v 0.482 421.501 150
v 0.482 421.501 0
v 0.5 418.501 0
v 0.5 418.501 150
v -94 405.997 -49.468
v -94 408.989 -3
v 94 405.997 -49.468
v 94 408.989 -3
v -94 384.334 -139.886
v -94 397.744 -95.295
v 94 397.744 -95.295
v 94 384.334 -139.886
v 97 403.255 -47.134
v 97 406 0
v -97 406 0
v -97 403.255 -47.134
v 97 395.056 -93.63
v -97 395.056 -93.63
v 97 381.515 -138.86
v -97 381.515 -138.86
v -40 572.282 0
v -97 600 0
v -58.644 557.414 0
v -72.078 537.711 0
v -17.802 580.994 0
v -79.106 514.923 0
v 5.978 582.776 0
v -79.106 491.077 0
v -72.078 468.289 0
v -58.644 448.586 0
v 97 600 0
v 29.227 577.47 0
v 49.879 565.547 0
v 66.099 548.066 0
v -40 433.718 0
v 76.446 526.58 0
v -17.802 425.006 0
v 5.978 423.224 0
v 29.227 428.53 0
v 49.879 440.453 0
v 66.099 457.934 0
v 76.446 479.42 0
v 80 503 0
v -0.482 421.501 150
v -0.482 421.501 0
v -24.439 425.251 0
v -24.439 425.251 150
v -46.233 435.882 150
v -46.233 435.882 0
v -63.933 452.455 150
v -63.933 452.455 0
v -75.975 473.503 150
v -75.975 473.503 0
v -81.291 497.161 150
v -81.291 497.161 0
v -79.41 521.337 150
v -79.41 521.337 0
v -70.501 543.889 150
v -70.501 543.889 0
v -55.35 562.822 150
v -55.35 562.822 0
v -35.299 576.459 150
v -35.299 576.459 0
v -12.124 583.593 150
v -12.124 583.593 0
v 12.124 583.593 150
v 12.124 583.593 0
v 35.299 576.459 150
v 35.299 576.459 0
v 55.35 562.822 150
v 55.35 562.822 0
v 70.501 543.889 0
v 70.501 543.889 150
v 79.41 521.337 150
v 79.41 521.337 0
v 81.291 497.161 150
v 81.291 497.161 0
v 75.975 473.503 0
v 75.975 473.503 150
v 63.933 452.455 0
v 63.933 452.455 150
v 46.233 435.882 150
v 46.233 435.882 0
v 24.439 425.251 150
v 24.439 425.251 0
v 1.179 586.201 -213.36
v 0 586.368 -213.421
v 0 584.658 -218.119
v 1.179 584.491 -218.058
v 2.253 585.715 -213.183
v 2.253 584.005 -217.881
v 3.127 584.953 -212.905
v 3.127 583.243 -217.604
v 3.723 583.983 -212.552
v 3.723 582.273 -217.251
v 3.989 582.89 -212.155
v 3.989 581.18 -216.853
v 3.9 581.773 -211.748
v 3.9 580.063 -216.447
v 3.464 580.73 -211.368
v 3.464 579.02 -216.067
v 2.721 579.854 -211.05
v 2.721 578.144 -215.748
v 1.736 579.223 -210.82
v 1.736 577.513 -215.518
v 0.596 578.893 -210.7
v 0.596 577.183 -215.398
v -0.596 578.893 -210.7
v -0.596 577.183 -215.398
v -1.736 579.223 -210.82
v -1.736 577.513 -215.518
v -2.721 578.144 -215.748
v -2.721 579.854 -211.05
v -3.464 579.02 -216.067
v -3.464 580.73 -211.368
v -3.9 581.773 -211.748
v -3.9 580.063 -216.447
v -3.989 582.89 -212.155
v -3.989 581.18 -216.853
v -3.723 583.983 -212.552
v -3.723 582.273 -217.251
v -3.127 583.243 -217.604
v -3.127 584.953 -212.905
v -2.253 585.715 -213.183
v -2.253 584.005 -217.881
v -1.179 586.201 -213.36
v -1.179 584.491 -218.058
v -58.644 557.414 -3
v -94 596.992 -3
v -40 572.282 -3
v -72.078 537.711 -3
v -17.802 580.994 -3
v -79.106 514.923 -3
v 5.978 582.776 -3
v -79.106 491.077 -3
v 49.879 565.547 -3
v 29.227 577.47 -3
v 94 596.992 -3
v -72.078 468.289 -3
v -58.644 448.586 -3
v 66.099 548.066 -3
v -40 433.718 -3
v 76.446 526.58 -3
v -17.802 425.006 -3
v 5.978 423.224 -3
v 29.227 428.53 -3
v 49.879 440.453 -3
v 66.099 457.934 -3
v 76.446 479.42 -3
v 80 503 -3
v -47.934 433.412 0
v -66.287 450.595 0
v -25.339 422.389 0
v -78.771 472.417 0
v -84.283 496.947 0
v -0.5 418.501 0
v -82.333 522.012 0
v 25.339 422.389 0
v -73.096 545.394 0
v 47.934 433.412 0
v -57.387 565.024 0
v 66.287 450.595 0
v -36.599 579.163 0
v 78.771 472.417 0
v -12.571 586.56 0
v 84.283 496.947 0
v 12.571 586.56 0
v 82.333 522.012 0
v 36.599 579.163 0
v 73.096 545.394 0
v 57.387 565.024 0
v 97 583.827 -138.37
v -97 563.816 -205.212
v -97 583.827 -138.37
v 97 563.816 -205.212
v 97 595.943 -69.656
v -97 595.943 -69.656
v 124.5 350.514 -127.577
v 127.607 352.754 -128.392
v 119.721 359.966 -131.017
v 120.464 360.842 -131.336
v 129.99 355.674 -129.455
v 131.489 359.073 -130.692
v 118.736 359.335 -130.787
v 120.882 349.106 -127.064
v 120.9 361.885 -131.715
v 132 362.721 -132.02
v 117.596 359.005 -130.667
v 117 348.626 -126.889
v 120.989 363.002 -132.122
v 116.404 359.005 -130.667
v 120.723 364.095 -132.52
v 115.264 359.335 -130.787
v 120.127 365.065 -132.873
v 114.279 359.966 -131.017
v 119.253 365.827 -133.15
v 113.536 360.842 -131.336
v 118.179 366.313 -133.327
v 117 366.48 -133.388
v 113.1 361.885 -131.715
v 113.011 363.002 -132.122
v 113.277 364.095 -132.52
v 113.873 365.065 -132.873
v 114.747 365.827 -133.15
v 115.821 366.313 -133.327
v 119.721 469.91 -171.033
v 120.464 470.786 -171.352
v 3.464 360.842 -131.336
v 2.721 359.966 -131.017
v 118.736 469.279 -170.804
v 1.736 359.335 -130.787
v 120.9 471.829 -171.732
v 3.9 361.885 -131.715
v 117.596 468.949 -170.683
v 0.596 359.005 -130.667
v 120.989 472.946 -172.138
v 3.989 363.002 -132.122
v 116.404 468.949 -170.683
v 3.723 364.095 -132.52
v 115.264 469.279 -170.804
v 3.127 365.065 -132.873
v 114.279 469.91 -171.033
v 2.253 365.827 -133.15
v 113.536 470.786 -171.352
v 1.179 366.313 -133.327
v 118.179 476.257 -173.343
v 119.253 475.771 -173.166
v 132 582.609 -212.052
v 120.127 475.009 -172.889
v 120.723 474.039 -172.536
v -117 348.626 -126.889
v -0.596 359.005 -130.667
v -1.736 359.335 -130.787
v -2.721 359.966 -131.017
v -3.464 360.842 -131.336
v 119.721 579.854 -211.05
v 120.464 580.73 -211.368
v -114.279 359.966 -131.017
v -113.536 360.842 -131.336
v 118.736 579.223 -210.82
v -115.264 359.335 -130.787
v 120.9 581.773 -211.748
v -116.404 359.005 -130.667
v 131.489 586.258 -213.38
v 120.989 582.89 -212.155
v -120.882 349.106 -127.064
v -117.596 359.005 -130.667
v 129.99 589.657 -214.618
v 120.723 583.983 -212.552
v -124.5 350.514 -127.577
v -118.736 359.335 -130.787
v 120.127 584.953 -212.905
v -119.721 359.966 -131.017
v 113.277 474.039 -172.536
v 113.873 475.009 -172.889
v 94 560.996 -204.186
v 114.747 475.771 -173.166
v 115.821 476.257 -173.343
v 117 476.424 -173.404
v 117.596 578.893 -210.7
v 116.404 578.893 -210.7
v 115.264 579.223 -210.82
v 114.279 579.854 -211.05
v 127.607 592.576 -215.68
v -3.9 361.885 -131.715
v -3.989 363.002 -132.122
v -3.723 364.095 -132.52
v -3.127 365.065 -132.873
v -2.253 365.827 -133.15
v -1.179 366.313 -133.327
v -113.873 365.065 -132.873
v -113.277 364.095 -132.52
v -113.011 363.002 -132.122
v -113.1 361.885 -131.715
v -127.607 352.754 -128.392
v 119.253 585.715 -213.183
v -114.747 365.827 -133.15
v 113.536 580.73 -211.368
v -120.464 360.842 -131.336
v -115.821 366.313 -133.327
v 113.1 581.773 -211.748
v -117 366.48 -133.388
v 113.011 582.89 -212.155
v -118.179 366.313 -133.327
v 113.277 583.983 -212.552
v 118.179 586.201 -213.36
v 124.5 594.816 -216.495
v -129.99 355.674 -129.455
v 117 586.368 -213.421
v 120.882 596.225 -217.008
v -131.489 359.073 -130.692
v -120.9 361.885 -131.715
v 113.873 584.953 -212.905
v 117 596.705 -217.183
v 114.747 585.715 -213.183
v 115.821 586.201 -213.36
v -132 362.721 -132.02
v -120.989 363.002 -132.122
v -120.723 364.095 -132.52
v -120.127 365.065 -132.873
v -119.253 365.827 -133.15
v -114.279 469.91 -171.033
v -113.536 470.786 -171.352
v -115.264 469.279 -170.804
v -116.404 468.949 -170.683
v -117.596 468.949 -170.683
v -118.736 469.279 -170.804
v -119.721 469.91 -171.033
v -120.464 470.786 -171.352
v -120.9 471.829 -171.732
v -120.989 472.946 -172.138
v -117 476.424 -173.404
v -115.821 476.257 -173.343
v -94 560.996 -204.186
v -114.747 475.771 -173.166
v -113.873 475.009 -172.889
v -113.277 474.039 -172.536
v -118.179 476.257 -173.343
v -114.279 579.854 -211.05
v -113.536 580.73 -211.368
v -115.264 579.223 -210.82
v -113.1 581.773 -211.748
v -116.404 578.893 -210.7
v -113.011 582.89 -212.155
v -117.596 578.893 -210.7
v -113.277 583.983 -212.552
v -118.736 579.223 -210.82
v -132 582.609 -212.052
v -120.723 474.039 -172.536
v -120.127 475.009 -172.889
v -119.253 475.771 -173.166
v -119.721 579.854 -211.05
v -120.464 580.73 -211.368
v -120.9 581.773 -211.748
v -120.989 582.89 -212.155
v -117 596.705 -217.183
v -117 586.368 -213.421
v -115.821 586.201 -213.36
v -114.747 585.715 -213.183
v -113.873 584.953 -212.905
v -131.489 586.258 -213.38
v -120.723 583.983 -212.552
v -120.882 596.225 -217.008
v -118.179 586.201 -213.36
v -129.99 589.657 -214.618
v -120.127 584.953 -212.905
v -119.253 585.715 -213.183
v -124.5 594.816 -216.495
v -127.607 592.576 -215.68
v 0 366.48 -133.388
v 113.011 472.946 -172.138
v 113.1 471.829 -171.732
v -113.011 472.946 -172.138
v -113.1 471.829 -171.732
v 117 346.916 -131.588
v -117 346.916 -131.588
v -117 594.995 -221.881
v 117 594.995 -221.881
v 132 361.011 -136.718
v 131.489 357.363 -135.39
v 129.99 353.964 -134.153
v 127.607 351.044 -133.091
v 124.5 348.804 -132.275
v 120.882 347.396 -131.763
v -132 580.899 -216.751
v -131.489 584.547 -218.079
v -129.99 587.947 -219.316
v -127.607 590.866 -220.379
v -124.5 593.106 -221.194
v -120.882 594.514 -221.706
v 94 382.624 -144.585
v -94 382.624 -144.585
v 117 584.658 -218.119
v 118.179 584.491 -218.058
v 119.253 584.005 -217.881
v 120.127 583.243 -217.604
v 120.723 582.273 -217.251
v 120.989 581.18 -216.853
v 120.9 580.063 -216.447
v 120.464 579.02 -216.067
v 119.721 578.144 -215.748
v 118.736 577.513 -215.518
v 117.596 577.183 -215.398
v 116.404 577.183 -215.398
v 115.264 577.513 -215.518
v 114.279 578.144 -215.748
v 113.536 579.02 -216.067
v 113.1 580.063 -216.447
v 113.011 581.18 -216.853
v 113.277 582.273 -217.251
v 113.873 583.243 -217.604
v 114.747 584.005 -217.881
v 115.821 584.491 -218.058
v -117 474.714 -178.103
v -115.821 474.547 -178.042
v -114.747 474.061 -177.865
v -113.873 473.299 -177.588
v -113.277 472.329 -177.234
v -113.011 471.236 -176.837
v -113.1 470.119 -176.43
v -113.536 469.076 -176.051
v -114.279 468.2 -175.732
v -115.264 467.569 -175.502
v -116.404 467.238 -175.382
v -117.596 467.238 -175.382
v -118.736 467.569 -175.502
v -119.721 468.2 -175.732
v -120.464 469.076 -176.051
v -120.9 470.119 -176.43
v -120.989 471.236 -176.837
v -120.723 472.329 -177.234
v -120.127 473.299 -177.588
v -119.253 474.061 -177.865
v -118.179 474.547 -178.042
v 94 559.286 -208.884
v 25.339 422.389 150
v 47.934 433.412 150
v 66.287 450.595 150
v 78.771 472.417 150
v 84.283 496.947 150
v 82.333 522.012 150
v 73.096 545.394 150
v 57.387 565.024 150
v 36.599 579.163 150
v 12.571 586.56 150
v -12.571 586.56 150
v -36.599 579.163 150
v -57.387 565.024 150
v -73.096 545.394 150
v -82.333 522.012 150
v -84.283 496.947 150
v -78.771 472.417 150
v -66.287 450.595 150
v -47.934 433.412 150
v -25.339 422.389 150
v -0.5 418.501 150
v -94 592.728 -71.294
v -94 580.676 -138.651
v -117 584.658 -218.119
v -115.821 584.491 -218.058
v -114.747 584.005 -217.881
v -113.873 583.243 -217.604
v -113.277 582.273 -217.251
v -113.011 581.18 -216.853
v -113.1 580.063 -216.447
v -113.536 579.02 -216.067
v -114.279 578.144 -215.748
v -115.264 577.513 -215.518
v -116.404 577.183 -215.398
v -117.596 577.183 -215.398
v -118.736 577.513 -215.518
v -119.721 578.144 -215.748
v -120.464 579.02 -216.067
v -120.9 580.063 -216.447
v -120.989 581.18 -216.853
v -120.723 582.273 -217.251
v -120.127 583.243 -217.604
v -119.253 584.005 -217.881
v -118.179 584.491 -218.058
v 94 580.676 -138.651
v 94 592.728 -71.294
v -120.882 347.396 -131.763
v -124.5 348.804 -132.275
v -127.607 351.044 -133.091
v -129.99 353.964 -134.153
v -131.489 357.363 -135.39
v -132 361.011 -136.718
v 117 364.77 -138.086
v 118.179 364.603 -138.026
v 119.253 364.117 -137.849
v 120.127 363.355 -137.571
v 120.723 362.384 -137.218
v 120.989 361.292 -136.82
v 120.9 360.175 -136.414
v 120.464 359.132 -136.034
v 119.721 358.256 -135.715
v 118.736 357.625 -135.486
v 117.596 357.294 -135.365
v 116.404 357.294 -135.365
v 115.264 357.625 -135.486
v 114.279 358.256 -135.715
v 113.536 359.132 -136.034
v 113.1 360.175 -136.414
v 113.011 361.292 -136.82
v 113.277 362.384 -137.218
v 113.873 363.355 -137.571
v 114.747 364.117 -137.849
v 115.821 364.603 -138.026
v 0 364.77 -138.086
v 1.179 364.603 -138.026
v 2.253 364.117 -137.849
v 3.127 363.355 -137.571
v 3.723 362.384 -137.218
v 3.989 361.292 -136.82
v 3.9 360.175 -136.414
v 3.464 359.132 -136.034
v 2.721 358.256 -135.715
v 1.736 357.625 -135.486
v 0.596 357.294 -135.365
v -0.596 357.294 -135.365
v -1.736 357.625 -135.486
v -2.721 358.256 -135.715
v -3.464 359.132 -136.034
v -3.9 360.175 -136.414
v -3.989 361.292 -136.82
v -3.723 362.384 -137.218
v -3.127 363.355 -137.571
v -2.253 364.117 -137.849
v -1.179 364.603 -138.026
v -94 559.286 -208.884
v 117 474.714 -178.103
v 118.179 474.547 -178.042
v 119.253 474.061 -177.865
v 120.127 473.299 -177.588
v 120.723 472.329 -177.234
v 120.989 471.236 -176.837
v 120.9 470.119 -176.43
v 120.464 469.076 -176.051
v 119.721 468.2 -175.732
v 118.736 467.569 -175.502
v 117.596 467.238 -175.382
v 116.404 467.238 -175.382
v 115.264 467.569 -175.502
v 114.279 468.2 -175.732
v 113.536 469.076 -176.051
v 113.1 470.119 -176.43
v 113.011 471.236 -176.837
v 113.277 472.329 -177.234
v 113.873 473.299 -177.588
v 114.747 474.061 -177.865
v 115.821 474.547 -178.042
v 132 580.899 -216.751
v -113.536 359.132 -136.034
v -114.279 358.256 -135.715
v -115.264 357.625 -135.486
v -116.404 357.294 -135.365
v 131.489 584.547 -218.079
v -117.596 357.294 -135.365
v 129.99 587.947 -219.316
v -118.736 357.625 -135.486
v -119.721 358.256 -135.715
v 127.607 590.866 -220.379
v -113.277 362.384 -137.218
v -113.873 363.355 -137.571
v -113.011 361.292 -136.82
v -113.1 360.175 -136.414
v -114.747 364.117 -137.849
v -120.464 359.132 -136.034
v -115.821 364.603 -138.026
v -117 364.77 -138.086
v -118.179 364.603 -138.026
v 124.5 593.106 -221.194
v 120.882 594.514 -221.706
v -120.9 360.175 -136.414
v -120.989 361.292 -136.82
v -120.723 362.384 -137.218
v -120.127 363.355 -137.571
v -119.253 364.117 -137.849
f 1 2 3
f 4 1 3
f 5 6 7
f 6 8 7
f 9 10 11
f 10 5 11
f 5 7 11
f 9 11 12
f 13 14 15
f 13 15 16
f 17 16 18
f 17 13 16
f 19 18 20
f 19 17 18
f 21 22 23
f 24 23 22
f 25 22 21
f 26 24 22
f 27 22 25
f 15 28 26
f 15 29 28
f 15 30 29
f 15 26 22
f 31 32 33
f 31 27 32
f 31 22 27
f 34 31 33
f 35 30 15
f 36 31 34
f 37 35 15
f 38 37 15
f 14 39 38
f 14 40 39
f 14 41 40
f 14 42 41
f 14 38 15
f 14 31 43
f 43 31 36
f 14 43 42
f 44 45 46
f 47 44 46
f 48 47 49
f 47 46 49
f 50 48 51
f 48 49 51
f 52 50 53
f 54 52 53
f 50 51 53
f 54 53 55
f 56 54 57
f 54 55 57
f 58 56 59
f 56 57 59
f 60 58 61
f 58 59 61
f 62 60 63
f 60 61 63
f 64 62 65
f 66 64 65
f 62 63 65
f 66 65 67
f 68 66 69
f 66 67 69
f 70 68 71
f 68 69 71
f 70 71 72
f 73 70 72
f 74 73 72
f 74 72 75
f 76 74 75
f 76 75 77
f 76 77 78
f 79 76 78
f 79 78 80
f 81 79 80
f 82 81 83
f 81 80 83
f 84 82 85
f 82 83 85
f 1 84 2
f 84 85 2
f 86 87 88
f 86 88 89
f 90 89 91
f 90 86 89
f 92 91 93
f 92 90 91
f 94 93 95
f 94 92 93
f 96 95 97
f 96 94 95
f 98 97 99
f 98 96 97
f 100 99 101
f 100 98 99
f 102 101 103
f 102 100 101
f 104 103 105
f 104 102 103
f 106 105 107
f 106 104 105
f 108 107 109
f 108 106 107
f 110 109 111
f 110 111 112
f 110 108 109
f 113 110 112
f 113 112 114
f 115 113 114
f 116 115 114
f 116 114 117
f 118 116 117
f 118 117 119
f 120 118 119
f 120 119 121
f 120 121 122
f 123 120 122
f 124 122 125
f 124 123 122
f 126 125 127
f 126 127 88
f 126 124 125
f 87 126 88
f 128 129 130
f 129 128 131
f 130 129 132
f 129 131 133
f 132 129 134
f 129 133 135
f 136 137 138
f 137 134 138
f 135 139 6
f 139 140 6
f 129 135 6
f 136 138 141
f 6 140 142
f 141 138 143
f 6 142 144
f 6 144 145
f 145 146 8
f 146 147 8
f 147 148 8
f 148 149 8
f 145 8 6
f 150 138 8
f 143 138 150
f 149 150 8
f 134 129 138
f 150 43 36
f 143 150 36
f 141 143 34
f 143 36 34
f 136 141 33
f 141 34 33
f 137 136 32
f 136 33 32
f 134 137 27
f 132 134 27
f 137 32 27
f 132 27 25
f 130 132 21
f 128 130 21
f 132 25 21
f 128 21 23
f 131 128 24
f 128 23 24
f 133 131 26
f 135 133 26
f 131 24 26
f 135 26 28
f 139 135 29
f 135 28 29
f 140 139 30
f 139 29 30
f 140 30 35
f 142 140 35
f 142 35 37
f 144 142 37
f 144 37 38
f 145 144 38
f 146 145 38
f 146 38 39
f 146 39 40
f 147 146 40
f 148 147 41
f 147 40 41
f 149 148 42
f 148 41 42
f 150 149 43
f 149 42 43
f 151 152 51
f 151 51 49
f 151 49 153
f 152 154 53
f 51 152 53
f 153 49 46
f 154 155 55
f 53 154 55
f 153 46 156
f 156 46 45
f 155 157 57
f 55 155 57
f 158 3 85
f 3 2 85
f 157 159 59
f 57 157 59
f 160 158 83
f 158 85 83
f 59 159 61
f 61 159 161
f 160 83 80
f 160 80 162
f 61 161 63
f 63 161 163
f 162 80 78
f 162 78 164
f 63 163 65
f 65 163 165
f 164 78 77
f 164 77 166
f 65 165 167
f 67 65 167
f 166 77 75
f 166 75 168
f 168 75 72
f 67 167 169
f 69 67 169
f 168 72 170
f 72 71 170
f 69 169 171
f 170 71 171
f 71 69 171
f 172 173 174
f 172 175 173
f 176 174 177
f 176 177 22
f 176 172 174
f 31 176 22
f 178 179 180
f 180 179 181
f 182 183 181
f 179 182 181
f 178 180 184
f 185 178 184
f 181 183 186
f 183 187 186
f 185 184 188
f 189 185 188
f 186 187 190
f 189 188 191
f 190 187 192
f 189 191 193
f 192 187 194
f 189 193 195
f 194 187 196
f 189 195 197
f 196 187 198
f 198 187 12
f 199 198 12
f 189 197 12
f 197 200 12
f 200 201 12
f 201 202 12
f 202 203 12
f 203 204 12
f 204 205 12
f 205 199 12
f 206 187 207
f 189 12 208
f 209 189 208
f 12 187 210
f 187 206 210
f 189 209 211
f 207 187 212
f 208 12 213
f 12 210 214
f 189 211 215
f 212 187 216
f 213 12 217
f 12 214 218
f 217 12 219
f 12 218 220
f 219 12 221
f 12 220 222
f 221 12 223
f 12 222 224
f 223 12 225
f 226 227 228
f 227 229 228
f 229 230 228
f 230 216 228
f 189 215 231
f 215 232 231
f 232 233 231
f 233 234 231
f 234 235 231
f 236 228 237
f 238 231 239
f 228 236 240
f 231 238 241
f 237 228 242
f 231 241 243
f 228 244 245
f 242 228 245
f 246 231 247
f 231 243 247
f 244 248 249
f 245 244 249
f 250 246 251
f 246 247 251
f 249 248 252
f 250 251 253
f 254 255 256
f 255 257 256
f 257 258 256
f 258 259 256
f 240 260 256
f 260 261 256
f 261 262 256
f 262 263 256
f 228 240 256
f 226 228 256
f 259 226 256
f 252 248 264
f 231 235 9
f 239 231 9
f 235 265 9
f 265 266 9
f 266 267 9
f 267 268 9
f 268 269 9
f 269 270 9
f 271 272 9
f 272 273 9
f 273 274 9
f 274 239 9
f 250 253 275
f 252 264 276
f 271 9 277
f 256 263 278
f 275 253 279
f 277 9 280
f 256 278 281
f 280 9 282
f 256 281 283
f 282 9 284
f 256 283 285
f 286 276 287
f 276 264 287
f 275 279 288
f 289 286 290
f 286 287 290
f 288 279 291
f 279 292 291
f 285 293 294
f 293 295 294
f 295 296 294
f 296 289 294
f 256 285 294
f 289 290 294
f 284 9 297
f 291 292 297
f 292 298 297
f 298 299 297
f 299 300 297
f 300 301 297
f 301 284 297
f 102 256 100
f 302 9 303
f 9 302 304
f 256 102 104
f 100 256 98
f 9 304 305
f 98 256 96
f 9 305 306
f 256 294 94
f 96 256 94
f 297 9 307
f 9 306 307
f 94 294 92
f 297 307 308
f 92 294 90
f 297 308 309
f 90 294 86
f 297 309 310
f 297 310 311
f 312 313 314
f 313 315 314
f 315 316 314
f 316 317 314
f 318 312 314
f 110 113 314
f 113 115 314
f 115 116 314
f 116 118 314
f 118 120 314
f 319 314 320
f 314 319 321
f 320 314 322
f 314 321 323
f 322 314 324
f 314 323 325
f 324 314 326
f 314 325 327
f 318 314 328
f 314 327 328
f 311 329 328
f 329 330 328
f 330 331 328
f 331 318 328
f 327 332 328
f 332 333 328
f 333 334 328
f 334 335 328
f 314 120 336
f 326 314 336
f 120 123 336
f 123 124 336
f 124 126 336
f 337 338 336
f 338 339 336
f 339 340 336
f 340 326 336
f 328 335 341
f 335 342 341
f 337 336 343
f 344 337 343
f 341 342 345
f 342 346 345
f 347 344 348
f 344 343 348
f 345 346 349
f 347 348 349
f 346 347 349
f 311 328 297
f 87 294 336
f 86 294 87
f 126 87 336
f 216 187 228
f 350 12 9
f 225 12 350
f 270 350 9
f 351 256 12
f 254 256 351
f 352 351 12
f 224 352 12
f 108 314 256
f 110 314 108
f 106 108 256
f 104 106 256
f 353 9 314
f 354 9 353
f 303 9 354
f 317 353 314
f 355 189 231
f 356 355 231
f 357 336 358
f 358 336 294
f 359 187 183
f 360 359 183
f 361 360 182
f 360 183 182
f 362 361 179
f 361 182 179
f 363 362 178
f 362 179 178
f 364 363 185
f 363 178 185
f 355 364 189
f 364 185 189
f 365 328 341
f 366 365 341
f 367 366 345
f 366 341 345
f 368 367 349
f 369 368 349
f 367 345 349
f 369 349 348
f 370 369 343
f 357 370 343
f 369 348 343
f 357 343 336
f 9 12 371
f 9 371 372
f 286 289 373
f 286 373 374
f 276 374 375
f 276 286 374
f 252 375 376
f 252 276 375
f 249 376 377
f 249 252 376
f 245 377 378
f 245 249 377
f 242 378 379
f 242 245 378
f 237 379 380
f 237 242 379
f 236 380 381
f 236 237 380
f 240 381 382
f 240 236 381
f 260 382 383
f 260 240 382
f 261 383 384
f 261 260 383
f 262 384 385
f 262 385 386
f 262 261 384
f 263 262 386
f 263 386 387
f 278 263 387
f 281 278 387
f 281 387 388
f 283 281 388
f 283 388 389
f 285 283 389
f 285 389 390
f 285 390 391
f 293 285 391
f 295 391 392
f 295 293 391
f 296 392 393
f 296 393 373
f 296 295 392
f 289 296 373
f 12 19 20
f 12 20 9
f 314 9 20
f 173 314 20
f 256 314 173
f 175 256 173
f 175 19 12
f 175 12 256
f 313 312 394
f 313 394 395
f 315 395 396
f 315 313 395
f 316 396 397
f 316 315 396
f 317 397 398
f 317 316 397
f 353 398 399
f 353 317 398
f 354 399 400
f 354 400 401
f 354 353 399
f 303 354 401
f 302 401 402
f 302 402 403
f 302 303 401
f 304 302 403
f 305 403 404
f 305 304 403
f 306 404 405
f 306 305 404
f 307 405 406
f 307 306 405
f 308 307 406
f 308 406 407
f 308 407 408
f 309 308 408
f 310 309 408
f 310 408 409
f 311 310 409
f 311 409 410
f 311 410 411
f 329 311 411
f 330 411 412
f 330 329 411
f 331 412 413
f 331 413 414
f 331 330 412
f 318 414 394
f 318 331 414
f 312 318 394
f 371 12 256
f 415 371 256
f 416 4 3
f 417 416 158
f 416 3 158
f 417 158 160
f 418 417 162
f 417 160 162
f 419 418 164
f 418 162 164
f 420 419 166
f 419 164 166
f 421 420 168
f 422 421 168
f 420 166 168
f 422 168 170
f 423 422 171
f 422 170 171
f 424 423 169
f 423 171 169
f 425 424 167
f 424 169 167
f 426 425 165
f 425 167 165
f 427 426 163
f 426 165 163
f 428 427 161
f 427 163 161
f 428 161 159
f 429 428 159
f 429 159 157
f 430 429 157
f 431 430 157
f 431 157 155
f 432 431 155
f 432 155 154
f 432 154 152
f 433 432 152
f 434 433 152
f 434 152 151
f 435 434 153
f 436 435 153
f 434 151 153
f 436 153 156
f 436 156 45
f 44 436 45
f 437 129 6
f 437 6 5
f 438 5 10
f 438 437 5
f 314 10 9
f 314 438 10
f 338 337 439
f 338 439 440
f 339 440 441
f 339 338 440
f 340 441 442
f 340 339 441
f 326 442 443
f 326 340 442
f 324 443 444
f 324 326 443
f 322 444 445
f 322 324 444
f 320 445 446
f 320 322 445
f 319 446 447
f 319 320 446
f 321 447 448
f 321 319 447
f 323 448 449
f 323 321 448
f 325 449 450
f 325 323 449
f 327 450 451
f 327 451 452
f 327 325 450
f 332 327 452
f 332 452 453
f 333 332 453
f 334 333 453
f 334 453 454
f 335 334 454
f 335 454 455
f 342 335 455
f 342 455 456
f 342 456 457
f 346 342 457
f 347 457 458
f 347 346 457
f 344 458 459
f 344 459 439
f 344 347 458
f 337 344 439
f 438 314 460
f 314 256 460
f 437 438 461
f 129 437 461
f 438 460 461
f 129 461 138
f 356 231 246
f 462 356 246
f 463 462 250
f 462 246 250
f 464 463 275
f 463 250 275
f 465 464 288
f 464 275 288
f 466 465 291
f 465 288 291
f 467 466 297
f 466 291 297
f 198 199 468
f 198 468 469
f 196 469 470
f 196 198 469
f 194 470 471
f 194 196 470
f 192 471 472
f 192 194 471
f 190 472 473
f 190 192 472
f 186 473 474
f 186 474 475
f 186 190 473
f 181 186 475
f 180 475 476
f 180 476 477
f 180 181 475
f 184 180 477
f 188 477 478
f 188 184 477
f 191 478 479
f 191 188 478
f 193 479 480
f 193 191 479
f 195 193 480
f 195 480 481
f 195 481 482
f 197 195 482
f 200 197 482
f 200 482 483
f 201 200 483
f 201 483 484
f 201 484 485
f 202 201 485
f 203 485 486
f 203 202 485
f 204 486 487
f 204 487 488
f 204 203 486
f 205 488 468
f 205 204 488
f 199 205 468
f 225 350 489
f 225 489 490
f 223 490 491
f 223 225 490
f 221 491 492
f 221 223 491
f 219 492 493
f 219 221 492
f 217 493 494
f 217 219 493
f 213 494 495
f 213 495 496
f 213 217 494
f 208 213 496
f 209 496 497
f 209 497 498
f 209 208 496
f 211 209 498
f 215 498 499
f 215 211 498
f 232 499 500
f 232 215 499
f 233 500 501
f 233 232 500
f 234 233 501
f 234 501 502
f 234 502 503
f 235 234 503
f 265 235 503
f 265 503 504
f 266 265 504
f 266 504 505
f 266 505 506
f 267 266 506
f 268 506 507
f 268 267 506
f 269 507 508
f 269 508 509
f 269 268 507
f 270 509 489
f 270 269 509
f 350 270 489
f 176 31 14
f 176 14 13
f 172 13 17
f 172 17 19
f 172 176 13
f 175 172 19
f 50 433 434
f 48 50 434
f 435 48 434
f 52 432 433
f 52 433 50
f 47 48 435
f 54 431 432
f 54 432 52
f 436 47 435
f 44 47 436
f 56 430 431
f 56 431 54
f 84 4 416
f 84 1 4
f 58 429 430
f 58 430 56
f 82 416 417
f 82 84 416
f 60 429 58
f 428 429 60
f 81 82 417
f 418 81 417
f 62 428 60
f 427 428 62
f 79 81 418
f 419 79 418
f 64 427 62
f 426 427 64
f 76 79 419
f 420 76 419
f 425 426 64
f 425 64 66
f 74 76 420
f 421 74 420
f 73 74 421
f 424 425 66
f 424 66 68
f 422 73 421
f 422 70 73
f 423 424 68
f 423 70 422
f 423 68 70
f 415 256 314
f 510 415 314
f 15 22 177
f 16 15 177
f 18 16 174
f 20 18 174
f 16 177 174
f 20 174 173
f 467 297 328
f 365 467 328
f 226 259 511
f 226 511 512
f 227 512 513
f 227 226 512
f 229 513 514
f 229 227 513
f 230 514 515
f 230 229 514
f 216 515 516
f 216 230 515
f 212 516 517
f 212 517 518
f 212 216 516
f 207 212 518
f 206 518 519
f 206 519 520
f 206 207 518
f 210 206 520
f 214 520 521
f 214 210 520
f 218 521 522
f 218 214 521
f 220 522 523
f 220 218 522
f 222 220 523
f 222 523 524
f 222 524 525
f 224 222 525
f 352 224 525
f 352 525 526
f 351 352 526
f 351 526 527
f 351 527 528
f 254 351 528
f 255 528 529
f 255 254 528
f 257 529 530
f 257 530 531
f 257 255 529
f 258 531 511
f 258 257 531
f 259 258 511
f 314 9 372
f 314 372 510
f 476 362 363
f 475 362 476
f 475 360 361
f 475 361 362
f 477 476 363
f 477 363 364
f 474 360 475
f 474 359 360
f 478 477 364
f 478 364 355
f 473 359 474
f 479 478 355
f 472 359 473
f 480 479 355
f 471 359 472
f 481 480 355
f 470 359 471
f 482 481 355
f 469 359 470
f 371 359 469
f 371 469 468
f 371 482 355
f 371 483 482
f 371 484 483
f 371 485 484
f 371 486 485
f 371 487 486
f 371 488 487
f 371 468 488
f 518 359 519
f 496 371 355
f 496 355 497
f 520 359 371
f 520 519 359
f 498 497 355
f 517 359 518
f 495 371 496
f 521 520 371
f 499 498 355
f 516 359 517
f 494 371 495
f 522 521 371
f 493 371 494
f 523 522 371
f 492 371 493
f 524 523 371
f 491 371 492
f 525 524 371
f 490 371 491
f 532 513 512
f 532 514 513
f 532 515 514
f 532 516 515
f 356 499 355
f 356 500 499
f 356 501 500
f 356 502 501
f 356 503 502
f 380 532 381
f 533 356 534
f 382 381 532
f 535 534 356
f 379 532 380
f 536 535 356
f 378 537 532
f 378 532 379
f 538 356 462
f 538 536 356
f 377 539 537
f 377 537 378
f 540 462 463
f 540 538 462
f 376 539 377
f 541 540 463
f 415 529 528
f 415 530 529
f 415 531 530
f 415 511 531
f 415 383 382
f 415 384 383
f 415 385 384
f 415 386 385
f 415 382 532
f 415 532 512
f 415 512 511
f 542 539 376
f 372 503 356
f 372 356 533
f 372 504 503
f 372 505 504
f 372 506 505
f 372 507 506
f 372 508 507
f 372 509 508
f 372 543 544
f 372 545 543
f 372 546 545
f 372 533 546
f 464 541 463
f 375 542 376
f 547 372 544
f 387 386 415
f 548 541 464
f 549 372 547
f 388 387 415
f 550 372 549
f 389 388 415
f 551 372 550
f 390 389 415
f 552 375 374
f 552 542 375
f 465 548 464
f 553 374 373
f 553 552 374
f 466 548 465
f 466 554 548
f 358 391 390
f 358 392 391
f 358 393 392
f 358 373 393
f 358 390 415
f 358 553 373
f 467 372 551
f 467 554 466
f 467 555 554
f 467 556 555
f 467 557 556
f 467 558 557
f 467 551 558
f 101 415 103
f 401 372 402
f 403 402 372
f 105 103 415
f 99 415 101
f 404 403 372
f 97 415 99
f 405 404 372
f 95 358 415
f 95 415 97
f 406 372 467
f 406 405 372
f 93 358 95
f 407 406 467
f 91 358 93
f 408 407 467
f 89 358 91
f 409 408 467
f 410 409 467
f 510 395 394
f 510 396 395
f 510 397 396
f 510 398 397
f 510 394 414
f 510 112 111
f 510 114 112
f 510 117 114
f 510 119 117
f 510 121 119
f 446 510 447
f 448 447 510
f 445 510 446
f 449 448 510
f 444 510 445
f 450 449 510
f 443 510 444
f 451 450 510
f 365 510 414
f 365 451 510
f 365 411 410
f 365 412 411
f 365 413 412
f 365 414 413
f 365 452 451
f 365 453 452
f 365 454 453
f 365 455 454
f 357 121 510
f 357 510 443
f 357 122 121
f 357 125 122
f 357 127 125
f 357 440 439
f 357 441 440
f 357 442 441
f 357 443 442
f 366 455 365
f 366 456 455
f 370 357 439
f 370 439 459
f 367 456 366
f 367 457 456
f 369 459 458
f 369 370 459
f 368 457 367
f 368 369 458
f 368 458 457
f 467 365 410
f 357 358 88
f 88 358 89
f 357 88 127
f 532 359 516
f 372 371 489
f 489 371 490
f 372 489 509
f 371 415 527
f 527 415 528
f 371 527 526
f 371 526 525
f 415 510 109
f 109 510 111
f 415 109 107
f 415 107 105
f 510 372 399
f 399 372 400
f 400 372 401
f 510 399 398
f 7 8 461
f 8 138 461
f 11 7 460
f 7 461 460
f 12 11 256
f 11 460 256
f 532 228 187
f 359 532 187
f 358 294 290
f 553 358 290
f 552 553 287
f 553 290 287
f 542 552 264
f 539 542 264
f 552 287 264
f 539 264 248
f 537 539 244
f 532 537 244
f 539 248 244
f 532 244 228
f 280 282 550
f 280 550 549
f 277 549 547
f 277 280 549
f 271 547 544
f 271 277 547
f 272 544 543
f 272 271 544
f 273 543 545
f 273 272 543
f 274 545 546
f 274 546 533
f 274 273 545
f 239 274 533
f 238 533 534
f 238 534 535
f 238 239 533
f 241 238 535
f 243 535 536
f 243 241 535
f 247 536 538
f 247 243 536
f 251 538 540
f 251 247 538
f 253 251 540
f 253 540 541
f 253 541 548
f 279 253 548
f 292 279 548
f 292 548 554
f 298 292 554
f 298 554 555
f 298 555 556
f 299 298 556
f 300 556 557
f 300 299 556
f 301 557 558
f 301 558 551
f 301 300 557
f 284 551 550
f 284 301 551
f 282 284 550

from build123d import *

# Parameters (mm, degrees)
BOSS_EXTRUDE1_DEPTH = 97
SHELL2_T            = -3
SKETCH2_R           = 80
CUT_EXTRUDE1_DEPTH  = 3
BASE_FLANGE1_DEPTH  = 150
SKETCH8_R           = 4
SKETCH8_W           = 188
SKETCH8_H           = 188
BOSS_EXTRUDE2_DEPTH = 5


# Sheet-metal steps are written as plain solids
with BuildPart() as part:
    # Sketch1 → Boss-Extrude1 (new, symmetric)
    with BuildSketch(Plane(origin=(0, 0, 0), x_dir=(0, 0, -1), z_dir=(1, 0, 0))):
        with BuildLine():
            Line((0, 600), (0, 406))
            ThreePointArc((0, 406), (70.501160133, 399.831947723), (138.86017819, 381.515204039))
            Line((138.86017819, 381.515204039), (205.212085995, 563.815572472))
            ThreePointArc((205.212085995, 563.815572472), (104.1889066, 590.884651807), (0, 600))
        make_face()
    extrude(amount=BOSS_EXTRUDE1_DEPTH, both=True)

    # Shell2
    shell2_openings = [part.faces().sort_by_distance(p)[0] for p in [
        (0, 472.665388255, -172.036132093),
    ]]
    offset(amount=SHELL2_T, openings=shell2_openings, kind=Kind.INTERSECTION)

    # Sketch2 → Cut-Extrude1 (cut)
    with BuildSketch(Plane.XY):
        with Locations((0, 503)):
            Circle(SKETCH2_R)
    extrude(amount=-CUT_EXTRUDE1_DEPTH, mode=Mode.SUBTRACT)


with BuildPart() as body_2:
    # Sketch3 → Base-Flange1 (new body)
    with BuildSketch(Plane.XY):
        with BuildLine():
            ThreePointArc((0.499997812, 418.50147929), (0, 587.5), (-0.499997812, 418.50147929))
            Line((-0.499997812, 418.50147929), (-0.48224641, 421.501426771))
            ThreePointArc((-0.48224641, 421.501426771), (0, 584.5), (0.48224641, 421.501426771))
            Line((0.48224641, 421.501426771), (0.499997812, 418.50147929))
        make_face()
    extrude(amount=BASE_FLANGE1_DEPTH)


with BuildPart() as body_3:
    # Sketch8 → Boss-Extrude2 (new body)
    with BuildSketch(Plane(origin=(0, 0, 0), x_dir=(-1, 0, 0), z_dir=(0, -0.3420201433256697, -0.939692620785908))):
        with BuildLine():
            Line((-117, 371), (117, 371))
            ThreePointArc((117, 371), (127.606601718, 375.393398282), (132, 386))
            Line((132, 386), (132, 620))
            ThreePointArc((132, 620), (127.606601718, 630.606601718), (117, 635))
            Line((117, 635), (-117, 635))
            ThreePointArc((-117, 635), (-127.606601718, 630.606601718), (-132, 620))
            Line((-132, 620), (-132, 386))
            ThreePointArc((-132, 386), (-127.606601718, 375.393398282), (-117, 371))
        make_face()
        with Locations(Location((-117, 620, 0), (0, 0, 90))):
            Circle(SKETCH8_R, mode=Mode.SUBTRACT)
        with Locations(Location((0, 620, 0), (0, 0, 90))):
            Circle(SKETCH8_R, mode=Mode.SUBTRACT)
        with Locations(Location((117, 620, 0), (0, 0, 90))):
            Circle(SKETCH8_R, mode=Mode.SUBTRACT)
        with Locations(Location((117, 503, 0), (0, 0, 90))):
            Circle(SKETCH8_R, mode=Mode.SUBTRACT)
        with Locations(Location((117, 386, 0), (0, 0, 90))):
            Circle(SKETCH8_R, mode=Mode.SUBTRACT)
        with Locations(Location((0, 386, 0), (0, 0, 90))):
            Circle(SKETCH8_R, mode=Mode.SUBTRACT)
        with Locations(Location((-117, 386, 0), (0, 0, 90))):
            Circle(SKETCH8_R, mode=Mode.SUBTRACT)
        with Locations(Location((-117, 503, 0), (0, 0, 90))):
            Circle(SKETCH8_R, mode=Mode.SUBTRACT)
        with Locations((0, 503)):
            Rectangle(SKETCH8_W, SKETCH8_H, mode=Mode.SUBTRACT)
    extrude(amount=BOSS_EXTRUDE2_DEPTH)


solid = Compound([part.part, body_2.part, body_3.part])
